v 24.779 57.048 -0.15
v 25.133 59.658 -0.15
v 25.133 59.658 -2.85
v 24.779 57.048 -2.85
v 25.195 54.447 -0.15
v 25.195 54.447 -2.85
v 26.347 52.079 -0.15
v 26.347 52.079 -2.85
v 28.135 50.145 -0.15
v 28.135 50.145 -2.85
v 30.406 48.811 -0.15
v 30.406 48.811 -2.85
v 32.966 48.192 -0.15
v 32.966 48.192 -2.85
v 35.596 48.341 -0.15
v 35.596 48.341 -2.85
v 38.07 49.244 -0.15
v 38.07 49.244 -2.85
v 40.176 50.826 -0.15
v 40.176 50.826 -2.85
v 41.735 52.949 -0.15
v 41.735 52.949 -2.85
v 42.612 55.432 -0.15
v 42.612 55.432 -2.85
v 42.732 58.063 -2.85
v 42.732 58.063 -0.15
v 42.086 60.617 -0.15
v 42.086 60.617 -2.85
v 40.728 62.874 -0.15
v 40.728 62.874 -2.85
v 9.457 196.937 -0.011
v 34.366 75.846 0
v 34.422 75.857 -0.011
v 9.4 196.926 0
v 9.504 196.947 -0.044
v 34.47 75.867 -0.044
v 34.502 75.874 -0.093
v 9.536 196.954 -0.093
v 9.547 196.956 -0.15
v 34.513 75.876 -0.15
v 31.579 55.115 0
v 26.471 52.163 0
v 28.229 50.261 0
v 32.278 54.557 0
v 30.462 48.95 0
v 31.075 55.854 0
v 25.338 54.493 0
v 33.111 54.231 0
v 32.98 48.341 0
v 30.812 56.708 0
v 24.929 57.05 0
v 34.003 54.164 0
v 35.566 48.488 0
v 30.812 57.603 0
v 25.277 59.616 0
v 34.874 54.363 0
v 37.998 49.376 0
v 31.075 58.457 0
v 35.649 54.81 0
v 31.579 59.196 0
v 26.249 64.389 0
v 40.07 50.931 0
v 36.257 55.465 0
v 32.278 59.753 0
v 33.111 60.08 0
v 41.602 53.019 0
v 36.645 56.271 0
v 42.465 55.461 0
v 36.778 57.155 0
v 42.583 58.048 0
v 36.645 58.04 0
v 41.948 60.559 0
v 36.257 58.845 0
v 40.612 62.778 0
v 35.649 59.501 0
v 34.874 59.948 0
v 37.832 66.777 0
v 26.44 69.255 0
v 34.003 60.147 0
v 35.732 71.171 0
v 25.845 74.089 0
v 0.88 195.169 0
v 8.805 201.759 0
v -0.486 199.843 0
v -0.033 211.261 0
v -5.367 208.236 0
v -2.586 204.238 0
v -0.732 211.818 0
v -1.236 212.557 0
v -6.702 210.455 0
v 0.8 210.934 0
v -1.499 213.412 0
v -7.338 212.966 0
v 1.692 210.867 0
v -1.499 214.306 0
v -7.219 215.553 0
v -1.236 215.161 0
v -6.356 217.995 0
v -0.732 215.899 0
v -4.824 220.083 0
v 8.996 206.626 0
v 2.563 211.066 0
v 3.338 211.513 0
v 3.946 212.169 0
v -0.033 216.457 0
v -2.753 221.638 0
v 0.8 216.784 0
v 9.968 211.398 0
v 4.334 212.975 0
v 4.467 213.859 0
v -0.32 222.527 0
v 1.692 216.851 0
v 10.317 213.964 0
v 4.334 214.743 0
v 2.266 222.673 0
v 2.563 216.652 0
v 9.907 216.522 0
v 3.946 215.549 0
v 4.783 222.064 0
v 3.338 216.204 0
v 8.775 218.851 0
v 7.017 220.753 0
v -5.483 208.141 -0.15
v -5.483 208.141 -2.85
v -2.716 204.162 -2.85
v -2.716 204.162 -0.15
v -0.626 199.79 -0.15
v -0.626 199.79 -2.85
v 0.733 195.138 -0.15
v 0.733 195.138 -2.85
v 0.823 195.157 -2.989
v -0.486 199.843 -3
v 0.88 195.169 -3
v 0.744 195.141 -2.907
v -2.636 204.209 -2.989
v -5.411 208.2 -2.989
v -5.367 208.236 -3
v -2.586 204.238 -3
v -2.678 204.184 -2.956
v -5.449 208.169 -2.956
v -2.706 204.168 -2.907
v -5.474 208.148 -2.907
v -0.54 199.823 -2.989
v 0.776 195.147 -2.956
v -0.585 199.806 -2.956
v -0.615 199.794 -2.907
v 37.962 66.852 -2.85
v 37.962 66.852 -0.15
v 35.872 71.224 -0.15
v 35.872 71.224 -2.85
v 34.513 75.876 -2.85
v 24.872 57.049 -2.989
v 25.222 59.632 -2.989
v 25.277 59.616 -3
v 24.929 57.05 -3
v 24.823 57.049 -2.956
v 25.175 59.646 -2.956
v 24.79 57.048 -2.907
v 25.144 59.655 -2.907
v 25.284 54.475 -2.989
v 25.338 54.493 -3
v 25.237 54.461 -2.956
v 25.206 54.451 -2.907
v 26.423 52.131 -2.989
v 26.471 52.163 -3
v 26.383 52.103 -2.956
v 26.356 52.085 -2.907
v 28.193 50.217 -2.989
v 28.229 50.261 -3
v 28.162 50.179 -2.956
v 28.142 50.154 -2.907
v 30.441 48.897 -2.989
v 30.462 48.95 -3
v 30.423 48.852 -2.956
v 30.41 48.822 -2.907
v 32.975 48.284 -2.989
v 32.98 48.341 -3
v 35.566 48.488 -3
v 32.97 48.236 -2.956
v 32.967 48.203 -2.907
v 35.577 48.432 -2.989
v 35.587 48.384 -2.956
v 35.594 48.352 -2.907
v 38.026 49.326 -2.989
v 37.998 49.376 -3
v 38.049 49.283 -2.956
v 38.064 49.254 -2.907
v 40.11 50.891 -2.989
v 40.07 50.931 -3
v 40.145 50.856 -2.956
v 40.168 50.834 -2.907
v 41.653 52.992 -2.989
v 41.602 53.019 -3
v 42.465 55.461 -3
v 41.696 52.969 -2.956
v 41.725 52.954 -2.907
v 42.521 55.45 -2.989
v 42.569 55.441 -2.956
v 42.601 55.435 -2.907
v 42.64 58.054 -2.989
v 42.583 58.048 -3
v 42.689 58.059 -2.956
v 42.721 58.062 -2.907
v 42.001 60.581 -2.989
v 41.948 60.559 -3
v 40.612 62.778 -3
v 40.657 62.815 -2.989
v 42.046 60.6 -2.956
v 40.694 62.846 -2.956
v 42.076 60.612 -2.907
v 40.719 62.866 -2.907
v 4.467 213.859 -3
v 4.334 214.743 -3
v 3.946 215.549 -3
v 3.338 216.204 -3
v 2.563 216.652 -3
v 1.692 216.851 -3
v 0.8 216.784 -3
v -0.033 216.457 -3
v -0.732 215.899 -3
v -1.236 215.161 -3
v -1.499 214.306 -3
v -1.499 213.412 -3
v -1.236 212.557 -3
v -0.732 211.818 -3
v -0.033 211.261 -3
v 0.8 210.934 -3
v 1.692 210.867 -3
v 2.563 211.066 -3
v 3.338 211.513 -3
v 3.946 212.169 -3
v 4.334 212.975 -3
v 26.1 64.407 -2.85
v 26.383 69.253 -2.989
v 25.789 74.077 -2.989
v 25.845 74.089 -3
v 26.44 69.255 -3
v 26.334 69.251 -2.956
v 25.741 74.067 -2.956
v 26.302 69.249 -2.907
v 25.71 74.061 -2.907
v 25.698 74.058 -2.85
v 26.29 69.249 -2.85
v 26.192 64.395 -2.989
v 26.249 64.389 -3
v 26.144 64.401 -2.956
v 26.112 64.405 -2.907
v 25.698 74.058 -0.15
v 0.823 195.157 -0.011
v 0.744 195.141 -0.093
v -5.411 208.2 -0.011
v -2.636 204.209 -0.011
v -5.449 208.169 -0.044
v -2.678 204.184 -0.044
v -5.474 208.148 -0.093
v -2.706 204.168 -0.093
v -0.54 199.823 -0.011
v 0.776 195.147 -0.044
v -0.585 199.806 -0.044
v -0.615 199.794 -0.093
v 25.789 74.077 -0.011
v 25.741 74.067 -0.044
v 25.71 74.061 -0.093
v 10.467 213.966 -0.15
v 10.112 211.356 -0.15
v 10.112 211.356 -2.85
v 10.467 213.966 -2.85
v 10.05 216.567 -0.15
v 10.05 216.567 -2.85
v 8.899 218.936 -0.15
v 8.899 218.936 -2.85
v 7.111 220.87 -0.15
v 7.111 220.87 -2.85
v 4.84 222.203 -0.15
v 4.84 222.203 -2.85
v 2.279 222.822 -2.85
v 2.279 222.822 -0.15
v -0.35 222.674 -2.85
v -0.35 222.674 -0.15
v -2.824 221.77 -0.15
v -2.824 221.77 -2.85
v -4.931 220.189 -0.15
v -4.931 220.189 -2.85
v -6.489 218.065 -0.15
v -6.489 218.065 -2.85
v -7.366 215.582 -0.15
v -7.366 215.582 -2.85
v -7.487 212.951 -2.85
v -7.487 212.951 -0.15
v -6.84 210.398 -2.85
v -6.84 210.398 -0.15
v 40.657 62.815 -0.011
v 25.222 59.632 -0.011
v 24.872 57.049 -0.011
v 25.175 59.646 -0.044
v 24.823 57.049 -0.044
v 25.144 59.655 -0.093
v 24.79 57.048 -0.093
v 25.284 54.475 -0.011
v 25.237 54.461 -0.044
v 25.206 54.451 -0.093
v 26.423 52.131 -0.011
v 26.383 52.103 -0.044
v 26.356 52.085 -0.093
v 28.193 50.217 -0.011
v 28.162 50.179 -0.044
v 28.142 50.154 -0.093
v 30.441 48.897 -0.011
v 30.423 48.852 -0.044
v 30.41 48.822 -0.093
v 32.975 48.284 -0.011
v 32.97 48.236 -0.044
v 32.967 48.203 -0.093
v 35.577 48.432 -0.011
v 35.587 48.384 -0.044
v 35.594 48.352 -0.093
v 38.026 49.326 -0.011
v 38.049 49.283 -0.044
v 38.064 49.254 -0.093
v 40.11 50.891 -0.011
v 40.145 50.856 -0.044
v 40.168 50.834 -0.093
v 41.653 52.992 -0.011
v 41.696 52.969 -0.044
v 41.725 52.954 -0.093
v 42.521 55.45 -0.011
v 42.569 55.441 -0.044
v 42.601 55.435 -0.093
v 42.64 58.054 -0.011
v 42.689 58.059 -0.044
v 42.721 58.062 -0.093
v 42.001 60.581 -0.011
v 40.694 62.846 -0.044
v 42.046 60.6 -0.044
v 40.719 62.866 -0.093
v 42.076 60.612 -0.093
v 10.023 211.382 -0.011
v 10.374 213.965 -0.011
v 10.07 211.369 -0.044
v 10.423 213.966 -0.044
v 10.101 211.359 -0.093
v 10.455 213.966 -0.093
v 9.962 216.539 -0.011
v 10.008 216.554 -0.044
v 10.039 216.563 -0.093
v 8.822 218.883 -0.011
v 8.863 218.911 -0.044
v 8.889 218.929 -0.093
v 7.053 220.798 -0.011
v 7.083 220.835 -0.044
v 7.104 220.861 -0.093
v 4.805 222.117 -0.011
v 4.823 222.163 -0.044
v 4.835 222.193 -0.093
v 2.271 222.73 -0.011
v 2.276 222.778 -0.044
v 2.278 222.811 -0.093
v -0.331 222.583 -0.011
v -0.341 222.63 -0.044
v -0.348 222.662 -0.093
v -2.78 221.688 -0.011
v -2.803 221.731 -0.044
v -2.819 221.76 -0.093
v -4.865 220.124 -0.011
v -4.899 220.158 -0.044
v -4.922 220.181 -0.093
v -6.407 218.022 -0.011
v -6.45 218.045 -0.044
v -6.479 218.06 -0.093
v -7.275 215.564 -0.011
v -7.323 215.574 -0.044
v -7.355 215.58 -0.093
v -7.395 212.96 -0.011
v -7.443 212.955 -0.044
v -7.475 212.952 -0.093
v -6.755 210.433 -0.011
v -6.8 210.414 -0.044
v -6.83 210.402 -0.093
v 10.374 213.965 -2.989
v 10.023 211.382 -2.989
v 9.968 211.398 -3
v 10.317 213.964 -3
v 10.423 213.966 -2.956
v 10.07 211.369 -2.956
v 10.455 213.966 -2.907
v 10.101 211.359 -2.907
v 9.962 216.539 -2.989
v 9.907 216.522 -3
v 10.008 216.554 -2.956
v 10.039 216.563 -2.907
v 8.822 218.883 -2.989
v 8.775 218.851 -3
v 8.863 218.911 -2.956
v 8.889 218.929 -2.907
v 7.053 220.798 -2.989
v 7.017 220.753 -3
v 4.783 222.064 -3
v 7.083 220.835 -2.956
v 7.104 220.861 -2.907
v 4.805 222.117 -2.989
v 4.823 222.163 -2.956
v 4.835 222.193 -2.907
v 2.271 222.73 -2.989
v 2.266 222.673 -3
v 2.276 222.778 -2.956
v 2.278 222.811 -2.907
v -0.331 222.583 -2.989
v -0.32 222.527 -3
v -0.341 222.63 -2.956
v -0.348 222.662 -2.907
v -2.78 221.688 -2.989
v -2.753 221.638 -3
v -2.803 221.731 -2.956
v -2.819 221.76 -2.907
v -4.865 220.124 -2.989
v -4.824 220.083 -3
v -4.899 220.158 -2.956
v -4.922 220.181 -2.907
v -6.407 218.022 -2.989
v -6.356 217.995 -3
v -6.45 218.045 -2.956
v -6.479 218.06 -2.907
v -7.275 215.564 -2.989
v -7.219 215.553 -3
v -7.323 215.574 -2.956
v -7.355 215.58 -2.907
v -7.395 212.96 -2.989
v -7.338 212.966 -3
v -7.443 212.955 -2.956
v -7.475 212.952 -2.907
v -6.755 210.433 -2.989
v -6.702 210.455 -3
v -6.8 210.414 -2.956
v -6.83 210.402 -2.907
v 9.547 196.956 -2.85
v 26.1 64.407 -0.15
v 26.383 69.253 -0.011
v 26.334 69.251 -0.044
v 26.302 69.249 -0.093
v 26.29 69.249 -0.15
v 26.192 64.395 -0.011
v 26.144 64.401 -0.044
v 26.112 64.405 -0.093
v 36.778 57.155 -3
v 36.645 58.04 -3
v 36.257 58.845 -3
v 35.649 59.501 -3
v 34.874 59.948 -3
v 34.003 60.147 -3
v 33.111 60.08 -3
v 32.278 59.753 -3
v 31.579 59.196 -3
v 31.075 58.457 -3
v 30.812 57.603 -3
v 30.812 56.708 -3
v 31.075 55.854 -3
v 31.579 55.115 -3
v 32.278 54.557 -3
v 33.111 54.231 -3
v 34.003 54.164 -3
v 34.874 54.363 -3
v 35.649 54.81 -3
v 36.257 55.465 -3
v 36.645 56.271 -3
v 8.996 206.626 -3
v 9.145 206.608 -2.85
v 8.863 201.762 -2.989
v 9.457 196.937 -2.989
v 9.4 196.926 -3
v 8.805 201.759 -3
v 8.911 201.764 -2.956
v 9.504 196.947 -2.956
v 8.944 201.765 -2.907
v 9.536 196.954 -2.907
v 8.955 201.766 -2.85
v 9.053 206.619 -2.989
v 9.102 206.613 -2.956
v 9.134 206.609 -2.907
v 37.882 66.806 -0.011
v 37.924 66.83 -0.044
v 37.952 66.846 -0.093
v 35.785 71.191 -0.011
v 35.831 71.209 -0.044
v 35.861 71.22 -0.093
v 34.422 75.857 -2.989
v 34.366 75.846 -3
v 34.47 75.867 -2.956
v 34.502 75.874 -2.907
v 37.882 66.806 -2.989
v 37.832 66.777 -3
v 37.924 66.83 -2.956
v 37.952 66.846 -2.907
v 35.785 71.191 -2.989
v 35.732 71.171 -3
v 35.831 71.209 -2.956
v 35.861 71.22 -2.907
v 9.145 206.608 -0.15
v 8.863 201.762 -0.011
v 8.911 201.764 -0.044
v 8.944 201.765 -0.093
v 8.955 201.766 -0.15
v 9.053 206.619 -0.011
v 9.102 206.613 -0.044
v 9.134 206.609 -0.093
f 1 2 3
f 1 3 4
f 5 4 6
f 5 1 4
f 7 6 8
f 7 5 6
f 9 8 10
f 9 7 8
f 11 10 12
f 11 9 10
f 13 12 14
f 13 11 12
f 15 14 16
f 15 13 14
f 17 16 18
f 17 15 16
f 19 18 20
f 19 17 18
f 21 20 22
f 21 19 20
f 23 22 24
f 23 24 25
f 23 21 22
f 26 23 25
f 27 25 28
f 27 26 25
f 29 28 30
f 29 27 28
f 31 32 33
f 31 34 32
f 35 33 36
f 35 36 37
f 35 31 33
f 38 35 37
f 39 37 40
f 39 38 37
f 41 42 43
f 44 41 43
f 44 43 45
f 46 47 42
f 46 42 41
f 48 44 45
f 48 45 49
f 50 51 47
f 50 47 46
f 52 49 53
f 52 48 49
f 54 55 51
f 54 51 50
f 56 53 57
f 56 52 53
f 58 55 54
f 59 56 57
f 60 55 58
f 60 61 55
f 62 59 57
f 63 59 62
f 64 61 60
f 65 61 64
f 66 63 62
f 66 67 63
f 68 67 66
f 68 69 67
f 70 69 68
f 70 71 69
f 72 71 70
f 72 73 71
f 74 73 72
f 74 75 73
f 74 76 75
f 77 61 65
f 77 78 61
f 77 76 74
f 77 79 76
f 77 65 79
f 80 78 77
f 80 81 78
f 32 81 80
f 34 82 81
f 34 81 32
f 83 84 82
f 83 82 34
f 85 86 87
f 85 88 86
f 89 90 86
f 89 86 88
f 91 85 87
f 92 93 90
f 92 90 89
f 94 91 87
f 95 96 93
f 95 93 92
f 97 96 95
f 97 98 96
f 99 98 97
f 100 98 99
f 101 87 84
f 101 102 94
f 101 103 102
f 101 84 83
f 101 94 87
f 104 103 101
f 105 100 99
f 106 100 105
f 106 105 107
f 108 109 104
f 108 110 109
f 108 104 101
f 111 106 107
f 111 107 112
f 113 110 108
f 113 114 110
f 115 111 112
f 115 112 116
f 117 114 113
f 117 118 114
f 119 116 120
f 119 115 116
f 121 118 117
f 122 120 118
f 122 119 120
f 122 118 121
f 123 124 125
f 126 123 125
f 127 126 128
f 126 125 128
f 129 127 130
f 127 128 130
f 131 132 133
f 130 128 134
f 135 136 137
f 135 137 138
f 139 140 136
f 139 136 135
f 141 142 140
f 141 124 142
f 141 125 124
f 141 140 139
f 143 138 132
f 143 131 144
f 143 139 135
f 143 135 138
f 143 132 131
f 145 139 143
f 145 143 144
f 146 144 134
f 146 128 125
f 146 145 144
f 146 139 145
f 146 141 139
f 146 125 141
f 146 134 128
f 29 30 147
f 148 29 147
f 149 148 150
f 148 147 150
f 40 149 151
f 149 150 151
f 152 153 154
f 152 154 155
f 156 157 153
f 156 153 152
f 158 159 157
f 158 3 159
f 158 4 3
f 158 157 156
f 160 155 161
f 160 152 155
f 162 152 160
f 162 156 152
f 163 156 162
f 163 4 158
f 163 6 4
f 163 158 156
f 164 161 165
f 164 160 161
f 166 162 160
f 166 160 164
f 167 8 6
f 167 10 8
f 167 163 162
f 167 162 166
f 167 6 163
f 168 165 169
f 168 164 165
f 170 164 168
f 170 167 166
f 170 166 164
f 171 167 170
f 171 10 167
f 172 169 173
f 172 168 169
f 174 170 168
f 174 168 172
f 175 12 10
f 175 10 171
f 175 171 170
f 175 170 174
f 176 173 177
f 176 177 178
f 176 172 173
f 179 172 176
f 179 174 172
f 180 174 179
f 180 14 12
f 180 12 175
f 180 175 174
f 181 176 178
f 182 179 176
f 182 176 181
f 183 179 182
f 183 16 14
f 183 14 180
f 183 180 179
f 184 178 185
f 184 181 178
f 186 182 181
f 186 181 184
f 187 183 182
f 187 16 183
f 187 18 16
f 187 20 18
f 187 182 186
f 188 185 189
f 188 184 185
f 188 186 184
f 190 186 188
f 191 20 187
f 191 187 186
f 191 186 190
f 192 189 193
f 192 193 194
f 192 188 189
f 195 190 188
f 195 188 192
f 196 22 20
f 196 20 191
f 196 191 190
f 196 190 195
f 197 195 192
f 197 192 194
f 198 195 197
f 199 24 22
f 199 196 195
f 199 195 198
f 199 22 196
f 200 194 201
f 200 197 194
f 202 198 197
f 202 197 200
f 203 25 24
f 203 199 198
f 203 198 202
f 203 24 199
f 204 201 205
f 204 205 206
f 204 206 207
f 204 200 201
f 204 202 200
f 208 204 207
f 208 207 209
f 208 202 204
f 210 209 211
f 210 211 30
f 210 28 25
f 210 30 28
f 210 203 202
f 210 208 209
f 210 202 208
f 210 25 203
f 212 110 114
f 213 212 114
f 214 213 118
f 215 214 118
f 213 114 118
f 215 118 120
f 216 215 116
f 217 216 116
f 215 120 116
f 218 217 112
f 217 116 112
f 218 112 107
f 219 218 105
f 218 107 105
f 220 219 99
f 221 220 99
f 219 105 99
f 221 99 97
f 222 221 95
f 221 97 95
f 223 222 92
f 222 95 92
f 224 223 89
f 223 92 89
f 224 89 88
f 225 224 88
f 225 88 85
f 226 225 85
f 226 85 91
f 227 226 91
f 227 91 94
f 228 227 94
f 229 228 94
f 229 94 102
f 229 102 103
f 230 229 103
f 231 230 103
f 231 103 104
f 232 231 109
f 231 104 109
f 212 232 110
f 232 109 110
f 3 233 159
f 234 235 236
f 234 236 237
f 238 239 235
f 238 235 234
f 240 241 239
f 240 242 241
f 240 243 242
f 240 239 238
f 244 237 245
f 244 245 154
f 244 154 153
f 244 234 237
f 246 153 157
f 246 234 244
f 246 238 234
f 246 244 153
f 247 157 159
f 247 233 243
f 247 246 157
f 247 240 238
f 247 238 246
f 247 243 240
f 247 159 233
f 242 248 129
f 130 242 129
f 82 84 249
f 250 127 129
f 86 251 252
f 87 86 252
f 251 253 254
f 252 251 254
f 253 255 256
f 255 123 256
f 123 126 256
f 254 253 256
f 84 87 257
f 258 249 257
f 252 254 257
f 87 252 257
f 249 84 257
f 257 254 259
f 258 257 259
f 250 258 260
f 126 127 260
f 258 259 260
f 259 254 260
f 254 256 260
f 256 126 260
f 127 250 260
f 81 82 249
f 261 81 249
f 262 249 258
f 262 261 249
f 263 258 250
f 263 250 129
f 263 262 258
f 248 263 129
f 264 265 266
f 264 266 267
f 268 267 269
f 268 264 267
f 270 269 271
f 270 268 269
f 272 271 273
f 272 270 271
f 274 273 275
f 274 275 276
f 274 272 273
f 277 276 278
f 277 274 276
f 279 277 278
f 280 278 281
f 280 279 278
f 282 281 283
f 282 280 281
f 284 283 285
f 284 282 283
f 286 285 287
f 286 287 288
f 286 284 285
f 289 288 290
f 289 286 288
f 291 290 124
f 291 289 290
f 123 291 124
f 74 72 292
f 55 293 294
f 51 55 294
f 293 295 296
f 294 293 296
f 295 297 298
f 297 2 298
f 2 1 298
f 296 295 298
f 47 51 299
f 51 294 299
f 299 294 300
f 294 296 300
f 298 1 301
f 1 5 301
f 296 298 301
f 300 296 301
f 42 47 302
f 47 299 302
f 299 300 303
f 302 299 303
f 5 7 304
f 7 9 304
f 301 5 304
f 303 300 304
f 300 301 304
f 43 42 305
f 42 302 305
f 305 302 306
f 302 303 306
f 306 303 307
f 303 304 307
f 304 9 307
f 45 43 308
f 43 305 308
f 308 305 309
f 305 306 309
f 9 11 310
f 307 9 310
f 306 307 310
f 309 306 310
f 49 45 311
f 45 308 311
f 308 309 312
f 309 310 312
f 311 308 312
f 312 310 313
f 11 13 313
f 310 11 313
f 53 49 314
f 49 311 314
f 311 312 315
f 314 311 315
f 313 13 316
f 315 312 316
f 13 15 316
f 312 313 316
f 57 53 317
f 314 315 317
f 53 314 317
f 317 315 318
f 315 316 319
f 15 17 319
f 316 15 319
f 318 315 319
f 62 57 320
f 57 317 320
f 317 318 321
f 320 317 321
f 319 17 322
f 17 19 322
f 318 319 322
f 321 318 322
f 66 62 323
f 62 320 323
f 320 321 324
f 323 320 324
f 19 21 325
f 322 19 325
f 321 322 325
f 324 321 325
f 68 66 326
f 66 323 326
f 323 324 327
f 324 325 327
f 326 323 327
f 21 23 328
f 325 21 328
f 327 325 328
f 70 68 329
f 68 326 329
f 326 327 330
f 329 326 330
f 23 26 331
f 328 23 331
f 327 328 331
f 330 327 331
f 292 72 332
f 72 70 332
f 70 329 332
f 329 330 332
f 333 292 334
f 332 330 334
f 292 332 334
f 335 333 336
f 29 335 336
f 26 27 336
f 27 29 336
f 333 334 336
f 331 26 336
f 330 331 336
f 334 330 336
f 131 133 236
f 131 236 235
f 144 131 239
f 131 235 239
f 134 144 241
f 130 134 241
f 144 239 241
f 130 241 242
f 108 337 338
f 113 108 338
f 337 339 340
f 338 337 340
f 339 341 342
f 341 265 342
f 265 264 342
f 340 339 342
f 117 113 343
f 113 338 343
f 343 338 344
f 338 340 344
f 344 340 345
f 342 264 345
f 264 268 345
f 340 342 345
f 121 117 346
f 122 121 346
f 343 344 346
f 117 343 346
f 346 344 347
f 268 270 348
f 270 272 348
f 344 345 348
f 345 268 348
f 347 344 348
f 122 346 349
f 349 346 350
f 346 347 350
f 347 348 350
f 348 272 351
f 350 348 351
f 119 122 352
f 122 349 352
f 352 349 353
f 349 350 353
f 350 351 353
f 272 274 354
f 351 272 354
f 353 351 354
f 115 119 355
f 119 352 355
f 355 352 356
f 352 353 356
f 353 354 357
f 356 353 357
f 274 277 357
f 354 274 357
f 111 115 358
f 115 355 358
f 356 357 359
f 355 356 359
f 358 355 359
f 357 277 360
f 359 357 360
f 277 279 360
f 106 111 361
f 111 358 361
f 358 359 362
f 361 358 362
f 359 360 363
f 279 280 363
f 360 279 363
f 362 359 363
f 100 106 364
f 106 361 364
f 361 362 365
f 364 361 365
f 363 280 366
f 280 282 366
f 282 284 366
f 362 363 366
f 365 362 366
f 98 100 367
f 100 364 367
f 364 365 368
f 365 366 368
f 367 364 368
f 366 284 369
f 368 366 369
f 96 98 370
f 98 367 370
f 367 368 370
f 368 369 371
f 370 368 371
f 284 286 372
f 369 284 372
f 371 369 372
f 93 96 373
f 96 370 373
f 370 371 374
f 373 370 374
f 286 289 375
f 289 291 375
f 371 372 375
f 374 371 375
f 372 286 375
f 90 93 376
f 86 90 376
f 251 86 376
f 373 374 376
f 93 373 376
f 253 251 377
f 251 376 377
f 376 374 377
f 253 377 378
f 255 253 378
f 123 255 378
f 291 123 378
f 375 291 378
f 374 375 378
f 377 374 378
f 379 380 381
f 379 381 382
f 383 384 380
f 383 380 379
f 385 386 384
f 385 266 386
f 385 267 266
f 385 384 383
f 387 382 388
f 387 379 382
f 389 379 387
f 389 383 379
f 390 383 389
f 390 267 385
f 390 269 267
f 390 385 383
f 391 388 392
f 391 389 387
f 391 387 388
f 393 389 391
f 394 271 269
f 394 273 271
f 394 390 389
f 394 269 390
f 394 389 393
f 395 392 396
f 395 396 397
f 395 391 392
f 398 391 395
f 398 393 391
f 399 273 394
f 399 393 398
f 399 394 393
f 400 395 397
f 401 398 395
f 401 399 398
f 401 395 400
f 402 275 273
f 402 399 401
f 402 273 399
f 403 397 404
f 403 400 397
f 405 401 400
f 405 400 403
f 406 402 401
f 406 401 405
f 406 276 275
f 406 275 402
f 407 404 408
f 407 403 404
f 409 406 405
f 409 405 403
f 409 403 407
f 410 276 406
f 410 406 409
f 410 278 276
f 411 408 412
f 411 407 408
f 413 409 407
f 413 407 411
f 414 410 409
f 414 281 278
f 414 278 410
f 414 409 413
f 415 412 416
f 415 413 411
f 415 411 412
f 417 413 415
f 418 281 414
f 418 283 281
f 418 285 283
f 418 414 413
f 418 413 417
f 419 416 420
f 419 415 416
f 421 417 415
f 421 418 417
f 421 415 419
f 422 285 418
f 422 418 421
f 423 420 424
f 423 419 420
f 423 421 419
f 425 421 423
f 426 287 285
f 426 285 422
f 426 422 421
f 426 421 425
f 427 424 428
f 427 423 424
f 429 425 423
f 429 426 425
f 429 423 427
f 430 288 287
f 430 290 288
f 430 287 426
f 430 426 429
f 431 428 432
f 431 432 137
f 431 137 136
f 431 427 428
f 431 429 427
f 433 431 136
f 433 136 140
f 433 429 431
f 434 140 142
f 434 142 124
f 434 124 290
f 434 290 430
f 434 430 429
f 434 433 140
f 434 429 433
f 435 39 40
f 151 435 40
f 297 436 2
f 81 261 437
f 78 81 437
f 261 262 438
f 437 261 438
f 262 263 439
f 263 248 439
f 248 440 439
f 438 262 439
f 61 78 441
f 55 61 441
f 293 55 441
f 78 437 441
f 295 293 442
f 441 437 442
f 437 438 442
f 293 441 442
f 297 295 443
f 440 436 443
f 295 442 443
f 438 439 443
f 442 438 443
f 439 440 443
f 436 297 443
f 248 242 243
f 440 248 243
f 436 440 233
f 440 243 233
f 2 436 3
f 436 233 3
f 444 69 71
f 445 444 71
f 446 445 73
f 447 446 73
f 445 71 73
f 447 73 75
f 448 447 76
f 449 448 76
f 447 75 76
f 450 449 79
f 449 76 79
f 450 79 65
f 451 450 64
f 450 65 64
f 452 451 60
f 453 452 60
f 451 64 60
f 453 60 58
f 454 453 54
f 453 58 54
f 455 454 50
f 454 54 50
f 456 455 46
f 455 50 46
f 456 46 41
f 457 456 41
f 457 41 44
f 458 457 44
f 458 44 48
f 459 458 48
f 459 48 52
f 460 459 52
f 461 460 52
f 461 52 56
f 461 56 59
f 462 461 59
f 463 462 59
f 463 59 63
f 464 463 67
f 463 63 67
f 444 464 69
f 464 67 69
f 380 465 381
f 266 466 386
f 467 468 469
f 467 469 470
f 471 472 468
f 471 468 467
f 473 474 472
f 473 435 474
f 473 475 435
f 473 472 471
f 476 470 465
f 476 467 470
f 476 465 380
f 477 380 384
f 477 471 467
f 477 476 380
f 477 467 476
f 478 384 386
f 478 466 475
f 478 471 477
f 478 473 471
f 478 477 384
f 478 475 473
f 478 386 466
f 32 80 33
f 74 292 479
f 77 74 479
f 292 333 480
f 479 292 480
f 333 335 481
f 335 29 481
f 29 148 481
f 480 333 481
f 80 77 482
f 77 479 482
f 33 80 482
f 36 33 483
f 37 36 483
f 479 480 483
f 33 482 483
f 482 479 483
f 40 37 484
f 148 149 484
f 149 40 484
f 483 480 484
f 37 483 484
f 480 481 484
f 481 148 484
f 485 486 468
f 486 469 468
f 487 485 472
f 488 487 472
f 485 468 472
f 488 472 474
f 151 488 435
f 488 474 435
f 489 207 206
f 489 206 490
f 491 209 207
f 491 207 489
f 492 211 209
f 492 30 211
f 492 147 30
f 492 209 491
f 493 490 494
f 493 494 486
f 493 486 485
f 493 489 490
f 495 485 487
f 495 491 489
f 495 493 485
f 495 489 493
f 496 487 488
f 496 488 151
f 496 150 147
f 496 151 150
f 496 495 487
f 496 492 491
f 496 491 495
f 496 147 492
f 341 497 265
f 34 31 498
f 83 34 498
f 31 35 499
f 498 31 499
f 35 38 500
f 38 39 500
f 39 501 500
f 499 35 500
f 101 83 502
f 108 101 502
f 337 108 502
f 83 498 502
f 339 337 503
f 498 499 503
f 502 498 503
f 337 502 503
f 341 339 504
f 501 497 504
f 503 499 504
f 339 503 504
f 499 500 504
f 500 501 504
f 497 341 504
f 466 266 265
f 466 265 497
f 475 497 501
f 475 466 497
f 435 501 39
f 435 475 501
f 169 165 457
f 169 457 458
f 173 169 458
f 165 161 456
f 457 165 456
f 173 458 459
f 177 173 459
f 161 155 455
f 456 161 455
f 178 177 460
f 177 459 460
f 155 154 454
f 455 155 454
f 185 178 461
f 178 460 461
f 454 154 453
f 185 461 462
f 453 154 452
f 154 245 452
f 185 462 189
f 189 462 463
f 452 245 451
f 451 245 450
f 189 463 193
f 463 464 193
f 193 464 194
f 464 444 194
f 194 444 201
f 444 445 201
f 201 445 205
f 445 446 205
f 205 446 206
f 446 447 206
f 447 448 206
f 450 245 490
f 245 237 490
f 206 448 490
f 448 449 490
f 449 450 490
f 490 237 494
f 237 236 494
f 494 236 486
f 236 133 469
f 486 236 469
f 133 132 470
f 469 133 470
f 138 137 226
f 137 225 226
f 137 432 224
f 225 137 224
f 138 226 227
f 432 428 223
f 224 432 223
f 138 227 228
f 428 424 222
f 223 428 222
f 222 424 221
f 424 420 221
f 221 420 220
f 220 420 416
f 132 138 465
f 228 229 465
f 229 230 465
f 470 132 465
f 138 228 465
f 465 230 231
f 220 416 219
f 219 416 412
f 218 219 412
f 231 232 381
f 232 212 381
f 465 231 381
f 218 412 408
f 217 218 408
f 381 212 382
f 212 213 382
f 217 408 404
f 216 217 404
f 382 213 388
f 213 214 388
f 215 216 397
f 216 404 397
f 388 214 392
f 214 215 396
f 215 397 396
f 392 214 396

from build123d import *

# Parameters (mm, degrees)
BOSS_EXTRUDE1_DEPTH = 3
FILLET1_R           = 30
FILLET2_R           = 0.15
SKETCH2_R           = 4.65
SKETCH2_R_2         = 3
BOSS_EXTRUDE2_DEPTH = 3


with BuildPart() as part:
    # Sketch1 → Boss-Extrude1 (new body)
    with BuildSketch(Plane.XY):
        with BuildLine():
            ThreePointArc((7.448612374, 207.134028056), (-0.350164285, 222.673500313), (-1.365961708, 205.316534248))
            Line((-1.365961708, 205.316534248), (-2.939957518, 212.950179327))
            ThreePointArc((-2.939957518, 212.950179327), (0.558582619, 218.266213272), (5.874616565, 214.767673135))
            Line((5.874616565, 214.767673135), (7.448612374, 207.134028056))
        make_face()
        with BuildLine():
            Line((29.371043524, 56.246640082), (-2.939957518, 212.950179327))
            ThreePointArc((-2.939957518, 212.950179327), (2.376076428, 209.45163919), (5.874616565, 214.767673135))
            Line((5.874616565, 214.767673135), (38.185617606, 58.064133891))
            ThreePointArc((38.185617606, 58.064133891), (32.869583661, 61.562674028), (29.371043524, 56.246640082))
        make_face()
        with BuildLine():
            ThreePointArc((38.185617606, 58.064133891), (34.687077469, 52.748099945), (29.371043524, 56.246640082))
            Line((29.371043524, 56.246640082), (27.797047714, 63.880285161))
            ThreePointArc((27.797047714, 63.880285161), (35.595824373, 48.340812904), (36.611621797, 65.69777897))
            Line((36.611621797, 65.69777897), (38.185617606, 58.064133891))
        make_face()
    extrude(amount=-BOSS_EXTRUDE1_DEPTH)

    # Fillet1
    fillet1_edges = [part.edges().sort_by_distance(p)[0] for p in [
        (-1.365961708, 205.316534248, -1.5),
        (7.448612374, 207.134028056, -1.5),
        (36.611621797, 65.69777897, -1.5),
        (27.797047714, 63.880285161, -1.5),
    ]]
    fillet(fillet1_edges, radius=FILLET1_R)

    # Fillet2
    fillet2_edges = [part.edges().sort_by_distance(p)[0] for p in [
        (35.595824373, 48.340812904, 0),
        (35.595824373, 48.340812904, -3),
        (22.030117085, 136.415903513, 0),
        (22.030117085, 136.415903513, -3),
        (5.874616565, 214.767673135, -3),
        (13.215543003, 134.598409705, 0),
        (13.215543003, 134.598409705, -3),
        (-0.350164285, 222.673500313, 0),
        (-0.350164285, 222.673500313, -3),
        (36.828265789, 68.99602006, 0),
        (36.828265789, 68.99602006, -3),
        (26.293400844, 66.823816204, 0),
        (26.293400844, 66.823816204, -3),
        (-1.582605701, 202.018293157, 0),
        (34.687077469, 52.748099945, -3),
        (-1.582605701, 202.018293157, -3),
        (8.952259244, 204.190497013, 0),
        (8.952259244, 204.190497013, -3),
        (34.687077469, 52.748099945, 0),
        (5.874616565, 214.767673135, 0),
    ]]
    fillet(fillet2_edges, radius=FILLET2_R)

    # Sketch2 → Boss-Extrude2 (add)
    with BuildSketch(Plane.XY):
        with Locations((1.467329524, 213.858926231)):
            Circle(SKETCH2_R)
        with Locations((1.467329524, 213.858926231)):
            Circle(SKETCH2_R_2, mode=Mode.SUBTRACT)
        with Locations((33.778330565, 57.155386987)):
            Circle(SKETCH2_R)
        with Locations((33.778330565, 57.155386987)):
            Circle(SKETCH2_R_2, mode=Mode.SUBTRACT)
    extrude(amount=-BOSS_EXTRUDE2_DEPTH)


solid = part.part
